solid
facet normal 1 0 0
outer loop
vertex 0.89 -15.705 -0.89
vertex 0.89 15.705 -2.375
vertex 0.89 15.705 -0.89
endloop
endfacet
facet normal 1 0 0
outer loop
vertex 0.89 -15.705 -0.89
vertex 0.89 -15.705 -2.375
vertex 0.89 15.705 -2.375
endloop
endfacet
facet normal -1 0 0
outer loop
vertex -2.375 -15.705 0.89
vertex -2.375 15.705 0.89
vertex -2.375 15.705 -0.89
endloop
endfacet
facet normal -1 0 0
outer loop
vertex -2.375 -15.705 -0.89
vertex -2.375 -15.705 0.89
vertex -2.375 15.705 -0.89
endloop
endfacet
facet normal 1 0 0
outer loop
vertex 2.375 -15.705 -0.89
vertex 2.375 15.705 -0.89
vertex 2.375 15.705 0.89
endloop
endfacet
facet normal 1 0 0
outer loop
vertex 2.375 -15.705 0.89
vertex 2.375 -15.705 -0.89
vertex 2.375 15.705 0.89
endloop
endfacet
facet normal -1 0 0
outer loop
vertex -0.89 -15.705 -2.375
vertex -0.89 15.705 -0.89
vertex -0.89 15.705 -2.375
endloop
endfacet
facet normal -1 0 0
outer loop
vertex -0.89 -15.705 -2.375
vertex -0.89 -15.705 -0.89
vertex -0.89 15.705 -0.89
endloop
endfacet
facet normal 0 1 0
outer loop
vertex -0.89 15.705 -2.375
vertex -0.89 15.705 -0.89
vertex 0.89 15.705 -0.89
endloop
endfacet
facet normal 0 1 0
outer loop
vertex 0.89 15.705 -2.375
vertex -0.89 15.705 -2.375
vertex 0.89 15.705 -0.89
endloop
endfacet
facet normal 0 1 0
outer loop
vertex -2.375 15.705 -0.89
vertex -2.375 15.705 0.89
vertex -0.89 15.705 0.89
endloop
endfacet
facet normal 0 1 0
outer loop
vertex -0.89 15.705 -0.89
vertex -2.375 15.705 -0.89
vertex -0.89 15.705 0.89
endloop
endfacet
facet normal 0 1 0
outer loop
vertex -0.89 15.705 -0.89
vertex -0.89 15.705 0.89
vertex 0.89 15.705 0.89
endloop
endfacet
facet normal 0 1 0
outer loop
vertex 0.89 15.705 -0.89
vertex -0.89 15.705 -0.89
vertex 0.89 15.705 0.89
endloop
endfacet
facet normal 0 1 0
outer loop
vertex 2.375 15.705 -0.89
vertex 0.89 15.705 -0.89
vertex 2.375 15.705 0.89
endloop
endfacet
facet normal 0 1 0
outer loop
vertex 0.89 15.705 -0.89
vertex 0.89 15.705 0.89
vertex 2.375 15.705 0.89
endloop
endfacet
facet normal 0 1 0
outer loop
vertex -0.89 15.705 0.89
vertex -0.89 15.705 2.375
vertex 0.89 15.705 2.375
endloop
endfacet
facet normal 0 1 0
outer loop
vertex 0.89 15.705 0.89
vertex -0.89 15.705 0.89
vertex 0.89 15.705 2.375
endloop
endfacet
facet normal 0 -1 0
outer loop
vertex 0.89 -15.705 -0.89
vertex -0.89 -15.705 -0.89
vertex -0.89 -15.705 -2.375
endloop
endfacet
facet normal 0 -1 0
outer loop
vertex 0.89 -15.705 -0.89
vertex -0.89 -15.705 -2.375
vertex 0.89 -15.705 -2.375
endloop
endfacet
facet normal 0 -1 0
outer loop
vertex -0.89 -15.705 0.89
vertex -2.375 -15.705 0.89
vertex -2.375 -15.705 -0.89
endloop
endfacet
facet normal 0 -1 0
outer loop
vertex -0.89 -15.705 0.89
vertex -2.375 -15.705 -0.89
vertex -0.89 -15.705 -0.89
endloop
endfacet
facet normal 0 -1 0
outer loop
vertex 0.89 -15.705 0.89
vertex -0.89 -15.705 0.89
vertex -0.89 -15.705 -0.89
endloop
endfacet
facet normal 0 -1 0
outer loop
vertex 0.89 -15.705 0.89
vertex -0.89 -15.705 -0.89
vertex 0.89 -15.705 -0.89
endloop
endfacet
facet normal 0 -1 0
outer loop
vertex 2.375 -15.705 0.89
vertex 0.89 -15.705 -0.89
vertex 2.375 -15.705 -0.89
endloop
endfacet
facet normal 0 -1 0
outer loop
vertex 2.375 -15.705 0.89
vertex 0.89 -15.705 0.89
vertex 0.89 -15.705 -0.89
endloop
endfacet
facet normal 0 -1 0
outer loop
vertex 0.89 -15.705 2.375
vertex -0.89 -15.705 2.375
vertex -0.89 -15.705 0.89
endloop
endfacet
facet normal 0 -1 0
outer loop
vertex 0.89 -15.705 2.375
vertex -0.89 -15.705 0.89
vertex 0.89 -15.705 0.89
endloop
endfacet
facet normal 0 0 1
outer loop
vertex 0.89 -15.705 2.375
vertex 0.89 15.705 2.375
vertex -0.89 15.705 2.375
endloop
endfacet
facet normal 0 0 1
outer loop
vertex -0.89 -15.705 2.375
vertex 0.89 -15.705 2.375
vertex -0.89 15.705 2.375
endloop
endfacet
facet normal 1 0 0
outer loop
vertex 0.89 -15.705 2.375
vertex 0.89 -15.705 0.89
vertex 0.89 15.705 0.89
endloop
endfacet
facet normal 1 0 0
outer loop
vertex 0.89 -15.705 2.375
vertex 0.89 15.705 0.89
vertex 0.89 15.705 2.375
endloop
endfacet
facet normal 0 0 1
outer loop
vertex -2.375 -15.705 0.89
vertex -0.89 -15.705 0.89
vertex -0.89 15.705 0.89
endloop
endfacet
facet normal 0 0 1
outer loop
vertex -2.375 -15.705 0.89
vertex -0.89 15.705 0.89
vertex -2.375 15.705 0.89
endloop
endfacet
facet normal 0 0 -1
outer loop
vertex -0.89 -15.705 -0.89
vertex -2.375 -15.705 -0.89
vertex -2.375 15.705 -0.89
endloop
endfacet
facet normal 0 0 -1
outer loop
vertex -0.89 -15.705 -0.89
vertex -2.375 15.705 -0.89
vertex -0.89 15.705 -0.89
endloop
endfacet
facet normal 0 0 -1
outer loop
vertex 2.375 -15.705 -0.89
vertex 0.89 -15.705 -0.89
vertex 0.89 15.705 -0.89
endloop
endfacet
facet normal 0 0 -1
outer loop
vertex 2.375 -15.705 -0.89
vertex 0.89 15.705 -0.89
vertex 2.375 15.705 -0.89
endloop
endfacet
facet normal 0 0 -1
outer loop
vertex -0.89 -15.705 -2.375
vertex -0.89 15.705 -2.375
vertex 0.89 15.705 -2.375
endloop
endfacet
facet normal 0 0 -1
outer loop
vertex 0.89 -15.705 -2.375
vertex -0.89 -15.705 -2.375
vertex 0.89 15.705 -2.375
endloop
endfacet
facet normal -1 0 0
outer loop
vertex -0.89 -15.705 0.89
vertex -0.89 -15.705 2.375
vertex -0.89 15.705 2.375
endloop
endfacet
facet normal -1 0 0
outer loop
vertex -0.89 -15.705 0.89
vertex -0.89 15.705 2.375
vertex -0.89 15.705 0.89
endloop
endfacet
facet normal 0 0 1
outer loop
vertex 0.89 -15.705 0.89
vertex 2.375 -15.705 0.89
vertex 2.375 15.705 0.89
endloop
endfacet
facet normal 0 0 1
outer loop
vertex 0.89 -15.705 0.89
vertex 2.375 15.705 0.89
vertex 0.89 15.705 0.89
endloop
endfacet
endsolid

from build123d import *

# Parameters (mm, degrees)
F0_W     = 0.89
F0_H     = 0.89
F1_DEPTH = 15.705


with BuildPart() as f1:
    # F0 (on Front) → F1 (new body, symmetric)
    with BuildSketch(Plane.XZ):
        Polygon((-0.89, 0.89), (-2.375, 0.89), (-2.375, -0.89), (-0.89, -0.89), (-0.89, 0), align=None)
        Polygon((-0.89, 2.375), (-0.89, 0.89), (0, 0.89), (0.89, 0.89), (0.89, 2.375), align=None)
        with Locations((-0.445, 0.445)):
            Rectangle(F0_W, F0_H)
        with Locations((0.445, 0.445)):
            Rectangle(F0_W, F0_H)
        with Locations((-0.445, -0.445)):
            Rectangle(F0_W, F0_H)
        Polygon((0, -0.89), (-0.89, -0.89), (-0.89, -2.375), (0.89, -2.375), (0.89, -0.89), align=None)
        Polygon((2.375, 0.89), (0.89, 0.89), (0.89, 0), (0.89, -0.89), (2.375, -0.89), align=None)
        with Locations((0.445, -0.445)):
            Rectangle(F0_W, F0_H)
    extrude(amount=F1_DEPTH, both=True)


solid = f1.part
